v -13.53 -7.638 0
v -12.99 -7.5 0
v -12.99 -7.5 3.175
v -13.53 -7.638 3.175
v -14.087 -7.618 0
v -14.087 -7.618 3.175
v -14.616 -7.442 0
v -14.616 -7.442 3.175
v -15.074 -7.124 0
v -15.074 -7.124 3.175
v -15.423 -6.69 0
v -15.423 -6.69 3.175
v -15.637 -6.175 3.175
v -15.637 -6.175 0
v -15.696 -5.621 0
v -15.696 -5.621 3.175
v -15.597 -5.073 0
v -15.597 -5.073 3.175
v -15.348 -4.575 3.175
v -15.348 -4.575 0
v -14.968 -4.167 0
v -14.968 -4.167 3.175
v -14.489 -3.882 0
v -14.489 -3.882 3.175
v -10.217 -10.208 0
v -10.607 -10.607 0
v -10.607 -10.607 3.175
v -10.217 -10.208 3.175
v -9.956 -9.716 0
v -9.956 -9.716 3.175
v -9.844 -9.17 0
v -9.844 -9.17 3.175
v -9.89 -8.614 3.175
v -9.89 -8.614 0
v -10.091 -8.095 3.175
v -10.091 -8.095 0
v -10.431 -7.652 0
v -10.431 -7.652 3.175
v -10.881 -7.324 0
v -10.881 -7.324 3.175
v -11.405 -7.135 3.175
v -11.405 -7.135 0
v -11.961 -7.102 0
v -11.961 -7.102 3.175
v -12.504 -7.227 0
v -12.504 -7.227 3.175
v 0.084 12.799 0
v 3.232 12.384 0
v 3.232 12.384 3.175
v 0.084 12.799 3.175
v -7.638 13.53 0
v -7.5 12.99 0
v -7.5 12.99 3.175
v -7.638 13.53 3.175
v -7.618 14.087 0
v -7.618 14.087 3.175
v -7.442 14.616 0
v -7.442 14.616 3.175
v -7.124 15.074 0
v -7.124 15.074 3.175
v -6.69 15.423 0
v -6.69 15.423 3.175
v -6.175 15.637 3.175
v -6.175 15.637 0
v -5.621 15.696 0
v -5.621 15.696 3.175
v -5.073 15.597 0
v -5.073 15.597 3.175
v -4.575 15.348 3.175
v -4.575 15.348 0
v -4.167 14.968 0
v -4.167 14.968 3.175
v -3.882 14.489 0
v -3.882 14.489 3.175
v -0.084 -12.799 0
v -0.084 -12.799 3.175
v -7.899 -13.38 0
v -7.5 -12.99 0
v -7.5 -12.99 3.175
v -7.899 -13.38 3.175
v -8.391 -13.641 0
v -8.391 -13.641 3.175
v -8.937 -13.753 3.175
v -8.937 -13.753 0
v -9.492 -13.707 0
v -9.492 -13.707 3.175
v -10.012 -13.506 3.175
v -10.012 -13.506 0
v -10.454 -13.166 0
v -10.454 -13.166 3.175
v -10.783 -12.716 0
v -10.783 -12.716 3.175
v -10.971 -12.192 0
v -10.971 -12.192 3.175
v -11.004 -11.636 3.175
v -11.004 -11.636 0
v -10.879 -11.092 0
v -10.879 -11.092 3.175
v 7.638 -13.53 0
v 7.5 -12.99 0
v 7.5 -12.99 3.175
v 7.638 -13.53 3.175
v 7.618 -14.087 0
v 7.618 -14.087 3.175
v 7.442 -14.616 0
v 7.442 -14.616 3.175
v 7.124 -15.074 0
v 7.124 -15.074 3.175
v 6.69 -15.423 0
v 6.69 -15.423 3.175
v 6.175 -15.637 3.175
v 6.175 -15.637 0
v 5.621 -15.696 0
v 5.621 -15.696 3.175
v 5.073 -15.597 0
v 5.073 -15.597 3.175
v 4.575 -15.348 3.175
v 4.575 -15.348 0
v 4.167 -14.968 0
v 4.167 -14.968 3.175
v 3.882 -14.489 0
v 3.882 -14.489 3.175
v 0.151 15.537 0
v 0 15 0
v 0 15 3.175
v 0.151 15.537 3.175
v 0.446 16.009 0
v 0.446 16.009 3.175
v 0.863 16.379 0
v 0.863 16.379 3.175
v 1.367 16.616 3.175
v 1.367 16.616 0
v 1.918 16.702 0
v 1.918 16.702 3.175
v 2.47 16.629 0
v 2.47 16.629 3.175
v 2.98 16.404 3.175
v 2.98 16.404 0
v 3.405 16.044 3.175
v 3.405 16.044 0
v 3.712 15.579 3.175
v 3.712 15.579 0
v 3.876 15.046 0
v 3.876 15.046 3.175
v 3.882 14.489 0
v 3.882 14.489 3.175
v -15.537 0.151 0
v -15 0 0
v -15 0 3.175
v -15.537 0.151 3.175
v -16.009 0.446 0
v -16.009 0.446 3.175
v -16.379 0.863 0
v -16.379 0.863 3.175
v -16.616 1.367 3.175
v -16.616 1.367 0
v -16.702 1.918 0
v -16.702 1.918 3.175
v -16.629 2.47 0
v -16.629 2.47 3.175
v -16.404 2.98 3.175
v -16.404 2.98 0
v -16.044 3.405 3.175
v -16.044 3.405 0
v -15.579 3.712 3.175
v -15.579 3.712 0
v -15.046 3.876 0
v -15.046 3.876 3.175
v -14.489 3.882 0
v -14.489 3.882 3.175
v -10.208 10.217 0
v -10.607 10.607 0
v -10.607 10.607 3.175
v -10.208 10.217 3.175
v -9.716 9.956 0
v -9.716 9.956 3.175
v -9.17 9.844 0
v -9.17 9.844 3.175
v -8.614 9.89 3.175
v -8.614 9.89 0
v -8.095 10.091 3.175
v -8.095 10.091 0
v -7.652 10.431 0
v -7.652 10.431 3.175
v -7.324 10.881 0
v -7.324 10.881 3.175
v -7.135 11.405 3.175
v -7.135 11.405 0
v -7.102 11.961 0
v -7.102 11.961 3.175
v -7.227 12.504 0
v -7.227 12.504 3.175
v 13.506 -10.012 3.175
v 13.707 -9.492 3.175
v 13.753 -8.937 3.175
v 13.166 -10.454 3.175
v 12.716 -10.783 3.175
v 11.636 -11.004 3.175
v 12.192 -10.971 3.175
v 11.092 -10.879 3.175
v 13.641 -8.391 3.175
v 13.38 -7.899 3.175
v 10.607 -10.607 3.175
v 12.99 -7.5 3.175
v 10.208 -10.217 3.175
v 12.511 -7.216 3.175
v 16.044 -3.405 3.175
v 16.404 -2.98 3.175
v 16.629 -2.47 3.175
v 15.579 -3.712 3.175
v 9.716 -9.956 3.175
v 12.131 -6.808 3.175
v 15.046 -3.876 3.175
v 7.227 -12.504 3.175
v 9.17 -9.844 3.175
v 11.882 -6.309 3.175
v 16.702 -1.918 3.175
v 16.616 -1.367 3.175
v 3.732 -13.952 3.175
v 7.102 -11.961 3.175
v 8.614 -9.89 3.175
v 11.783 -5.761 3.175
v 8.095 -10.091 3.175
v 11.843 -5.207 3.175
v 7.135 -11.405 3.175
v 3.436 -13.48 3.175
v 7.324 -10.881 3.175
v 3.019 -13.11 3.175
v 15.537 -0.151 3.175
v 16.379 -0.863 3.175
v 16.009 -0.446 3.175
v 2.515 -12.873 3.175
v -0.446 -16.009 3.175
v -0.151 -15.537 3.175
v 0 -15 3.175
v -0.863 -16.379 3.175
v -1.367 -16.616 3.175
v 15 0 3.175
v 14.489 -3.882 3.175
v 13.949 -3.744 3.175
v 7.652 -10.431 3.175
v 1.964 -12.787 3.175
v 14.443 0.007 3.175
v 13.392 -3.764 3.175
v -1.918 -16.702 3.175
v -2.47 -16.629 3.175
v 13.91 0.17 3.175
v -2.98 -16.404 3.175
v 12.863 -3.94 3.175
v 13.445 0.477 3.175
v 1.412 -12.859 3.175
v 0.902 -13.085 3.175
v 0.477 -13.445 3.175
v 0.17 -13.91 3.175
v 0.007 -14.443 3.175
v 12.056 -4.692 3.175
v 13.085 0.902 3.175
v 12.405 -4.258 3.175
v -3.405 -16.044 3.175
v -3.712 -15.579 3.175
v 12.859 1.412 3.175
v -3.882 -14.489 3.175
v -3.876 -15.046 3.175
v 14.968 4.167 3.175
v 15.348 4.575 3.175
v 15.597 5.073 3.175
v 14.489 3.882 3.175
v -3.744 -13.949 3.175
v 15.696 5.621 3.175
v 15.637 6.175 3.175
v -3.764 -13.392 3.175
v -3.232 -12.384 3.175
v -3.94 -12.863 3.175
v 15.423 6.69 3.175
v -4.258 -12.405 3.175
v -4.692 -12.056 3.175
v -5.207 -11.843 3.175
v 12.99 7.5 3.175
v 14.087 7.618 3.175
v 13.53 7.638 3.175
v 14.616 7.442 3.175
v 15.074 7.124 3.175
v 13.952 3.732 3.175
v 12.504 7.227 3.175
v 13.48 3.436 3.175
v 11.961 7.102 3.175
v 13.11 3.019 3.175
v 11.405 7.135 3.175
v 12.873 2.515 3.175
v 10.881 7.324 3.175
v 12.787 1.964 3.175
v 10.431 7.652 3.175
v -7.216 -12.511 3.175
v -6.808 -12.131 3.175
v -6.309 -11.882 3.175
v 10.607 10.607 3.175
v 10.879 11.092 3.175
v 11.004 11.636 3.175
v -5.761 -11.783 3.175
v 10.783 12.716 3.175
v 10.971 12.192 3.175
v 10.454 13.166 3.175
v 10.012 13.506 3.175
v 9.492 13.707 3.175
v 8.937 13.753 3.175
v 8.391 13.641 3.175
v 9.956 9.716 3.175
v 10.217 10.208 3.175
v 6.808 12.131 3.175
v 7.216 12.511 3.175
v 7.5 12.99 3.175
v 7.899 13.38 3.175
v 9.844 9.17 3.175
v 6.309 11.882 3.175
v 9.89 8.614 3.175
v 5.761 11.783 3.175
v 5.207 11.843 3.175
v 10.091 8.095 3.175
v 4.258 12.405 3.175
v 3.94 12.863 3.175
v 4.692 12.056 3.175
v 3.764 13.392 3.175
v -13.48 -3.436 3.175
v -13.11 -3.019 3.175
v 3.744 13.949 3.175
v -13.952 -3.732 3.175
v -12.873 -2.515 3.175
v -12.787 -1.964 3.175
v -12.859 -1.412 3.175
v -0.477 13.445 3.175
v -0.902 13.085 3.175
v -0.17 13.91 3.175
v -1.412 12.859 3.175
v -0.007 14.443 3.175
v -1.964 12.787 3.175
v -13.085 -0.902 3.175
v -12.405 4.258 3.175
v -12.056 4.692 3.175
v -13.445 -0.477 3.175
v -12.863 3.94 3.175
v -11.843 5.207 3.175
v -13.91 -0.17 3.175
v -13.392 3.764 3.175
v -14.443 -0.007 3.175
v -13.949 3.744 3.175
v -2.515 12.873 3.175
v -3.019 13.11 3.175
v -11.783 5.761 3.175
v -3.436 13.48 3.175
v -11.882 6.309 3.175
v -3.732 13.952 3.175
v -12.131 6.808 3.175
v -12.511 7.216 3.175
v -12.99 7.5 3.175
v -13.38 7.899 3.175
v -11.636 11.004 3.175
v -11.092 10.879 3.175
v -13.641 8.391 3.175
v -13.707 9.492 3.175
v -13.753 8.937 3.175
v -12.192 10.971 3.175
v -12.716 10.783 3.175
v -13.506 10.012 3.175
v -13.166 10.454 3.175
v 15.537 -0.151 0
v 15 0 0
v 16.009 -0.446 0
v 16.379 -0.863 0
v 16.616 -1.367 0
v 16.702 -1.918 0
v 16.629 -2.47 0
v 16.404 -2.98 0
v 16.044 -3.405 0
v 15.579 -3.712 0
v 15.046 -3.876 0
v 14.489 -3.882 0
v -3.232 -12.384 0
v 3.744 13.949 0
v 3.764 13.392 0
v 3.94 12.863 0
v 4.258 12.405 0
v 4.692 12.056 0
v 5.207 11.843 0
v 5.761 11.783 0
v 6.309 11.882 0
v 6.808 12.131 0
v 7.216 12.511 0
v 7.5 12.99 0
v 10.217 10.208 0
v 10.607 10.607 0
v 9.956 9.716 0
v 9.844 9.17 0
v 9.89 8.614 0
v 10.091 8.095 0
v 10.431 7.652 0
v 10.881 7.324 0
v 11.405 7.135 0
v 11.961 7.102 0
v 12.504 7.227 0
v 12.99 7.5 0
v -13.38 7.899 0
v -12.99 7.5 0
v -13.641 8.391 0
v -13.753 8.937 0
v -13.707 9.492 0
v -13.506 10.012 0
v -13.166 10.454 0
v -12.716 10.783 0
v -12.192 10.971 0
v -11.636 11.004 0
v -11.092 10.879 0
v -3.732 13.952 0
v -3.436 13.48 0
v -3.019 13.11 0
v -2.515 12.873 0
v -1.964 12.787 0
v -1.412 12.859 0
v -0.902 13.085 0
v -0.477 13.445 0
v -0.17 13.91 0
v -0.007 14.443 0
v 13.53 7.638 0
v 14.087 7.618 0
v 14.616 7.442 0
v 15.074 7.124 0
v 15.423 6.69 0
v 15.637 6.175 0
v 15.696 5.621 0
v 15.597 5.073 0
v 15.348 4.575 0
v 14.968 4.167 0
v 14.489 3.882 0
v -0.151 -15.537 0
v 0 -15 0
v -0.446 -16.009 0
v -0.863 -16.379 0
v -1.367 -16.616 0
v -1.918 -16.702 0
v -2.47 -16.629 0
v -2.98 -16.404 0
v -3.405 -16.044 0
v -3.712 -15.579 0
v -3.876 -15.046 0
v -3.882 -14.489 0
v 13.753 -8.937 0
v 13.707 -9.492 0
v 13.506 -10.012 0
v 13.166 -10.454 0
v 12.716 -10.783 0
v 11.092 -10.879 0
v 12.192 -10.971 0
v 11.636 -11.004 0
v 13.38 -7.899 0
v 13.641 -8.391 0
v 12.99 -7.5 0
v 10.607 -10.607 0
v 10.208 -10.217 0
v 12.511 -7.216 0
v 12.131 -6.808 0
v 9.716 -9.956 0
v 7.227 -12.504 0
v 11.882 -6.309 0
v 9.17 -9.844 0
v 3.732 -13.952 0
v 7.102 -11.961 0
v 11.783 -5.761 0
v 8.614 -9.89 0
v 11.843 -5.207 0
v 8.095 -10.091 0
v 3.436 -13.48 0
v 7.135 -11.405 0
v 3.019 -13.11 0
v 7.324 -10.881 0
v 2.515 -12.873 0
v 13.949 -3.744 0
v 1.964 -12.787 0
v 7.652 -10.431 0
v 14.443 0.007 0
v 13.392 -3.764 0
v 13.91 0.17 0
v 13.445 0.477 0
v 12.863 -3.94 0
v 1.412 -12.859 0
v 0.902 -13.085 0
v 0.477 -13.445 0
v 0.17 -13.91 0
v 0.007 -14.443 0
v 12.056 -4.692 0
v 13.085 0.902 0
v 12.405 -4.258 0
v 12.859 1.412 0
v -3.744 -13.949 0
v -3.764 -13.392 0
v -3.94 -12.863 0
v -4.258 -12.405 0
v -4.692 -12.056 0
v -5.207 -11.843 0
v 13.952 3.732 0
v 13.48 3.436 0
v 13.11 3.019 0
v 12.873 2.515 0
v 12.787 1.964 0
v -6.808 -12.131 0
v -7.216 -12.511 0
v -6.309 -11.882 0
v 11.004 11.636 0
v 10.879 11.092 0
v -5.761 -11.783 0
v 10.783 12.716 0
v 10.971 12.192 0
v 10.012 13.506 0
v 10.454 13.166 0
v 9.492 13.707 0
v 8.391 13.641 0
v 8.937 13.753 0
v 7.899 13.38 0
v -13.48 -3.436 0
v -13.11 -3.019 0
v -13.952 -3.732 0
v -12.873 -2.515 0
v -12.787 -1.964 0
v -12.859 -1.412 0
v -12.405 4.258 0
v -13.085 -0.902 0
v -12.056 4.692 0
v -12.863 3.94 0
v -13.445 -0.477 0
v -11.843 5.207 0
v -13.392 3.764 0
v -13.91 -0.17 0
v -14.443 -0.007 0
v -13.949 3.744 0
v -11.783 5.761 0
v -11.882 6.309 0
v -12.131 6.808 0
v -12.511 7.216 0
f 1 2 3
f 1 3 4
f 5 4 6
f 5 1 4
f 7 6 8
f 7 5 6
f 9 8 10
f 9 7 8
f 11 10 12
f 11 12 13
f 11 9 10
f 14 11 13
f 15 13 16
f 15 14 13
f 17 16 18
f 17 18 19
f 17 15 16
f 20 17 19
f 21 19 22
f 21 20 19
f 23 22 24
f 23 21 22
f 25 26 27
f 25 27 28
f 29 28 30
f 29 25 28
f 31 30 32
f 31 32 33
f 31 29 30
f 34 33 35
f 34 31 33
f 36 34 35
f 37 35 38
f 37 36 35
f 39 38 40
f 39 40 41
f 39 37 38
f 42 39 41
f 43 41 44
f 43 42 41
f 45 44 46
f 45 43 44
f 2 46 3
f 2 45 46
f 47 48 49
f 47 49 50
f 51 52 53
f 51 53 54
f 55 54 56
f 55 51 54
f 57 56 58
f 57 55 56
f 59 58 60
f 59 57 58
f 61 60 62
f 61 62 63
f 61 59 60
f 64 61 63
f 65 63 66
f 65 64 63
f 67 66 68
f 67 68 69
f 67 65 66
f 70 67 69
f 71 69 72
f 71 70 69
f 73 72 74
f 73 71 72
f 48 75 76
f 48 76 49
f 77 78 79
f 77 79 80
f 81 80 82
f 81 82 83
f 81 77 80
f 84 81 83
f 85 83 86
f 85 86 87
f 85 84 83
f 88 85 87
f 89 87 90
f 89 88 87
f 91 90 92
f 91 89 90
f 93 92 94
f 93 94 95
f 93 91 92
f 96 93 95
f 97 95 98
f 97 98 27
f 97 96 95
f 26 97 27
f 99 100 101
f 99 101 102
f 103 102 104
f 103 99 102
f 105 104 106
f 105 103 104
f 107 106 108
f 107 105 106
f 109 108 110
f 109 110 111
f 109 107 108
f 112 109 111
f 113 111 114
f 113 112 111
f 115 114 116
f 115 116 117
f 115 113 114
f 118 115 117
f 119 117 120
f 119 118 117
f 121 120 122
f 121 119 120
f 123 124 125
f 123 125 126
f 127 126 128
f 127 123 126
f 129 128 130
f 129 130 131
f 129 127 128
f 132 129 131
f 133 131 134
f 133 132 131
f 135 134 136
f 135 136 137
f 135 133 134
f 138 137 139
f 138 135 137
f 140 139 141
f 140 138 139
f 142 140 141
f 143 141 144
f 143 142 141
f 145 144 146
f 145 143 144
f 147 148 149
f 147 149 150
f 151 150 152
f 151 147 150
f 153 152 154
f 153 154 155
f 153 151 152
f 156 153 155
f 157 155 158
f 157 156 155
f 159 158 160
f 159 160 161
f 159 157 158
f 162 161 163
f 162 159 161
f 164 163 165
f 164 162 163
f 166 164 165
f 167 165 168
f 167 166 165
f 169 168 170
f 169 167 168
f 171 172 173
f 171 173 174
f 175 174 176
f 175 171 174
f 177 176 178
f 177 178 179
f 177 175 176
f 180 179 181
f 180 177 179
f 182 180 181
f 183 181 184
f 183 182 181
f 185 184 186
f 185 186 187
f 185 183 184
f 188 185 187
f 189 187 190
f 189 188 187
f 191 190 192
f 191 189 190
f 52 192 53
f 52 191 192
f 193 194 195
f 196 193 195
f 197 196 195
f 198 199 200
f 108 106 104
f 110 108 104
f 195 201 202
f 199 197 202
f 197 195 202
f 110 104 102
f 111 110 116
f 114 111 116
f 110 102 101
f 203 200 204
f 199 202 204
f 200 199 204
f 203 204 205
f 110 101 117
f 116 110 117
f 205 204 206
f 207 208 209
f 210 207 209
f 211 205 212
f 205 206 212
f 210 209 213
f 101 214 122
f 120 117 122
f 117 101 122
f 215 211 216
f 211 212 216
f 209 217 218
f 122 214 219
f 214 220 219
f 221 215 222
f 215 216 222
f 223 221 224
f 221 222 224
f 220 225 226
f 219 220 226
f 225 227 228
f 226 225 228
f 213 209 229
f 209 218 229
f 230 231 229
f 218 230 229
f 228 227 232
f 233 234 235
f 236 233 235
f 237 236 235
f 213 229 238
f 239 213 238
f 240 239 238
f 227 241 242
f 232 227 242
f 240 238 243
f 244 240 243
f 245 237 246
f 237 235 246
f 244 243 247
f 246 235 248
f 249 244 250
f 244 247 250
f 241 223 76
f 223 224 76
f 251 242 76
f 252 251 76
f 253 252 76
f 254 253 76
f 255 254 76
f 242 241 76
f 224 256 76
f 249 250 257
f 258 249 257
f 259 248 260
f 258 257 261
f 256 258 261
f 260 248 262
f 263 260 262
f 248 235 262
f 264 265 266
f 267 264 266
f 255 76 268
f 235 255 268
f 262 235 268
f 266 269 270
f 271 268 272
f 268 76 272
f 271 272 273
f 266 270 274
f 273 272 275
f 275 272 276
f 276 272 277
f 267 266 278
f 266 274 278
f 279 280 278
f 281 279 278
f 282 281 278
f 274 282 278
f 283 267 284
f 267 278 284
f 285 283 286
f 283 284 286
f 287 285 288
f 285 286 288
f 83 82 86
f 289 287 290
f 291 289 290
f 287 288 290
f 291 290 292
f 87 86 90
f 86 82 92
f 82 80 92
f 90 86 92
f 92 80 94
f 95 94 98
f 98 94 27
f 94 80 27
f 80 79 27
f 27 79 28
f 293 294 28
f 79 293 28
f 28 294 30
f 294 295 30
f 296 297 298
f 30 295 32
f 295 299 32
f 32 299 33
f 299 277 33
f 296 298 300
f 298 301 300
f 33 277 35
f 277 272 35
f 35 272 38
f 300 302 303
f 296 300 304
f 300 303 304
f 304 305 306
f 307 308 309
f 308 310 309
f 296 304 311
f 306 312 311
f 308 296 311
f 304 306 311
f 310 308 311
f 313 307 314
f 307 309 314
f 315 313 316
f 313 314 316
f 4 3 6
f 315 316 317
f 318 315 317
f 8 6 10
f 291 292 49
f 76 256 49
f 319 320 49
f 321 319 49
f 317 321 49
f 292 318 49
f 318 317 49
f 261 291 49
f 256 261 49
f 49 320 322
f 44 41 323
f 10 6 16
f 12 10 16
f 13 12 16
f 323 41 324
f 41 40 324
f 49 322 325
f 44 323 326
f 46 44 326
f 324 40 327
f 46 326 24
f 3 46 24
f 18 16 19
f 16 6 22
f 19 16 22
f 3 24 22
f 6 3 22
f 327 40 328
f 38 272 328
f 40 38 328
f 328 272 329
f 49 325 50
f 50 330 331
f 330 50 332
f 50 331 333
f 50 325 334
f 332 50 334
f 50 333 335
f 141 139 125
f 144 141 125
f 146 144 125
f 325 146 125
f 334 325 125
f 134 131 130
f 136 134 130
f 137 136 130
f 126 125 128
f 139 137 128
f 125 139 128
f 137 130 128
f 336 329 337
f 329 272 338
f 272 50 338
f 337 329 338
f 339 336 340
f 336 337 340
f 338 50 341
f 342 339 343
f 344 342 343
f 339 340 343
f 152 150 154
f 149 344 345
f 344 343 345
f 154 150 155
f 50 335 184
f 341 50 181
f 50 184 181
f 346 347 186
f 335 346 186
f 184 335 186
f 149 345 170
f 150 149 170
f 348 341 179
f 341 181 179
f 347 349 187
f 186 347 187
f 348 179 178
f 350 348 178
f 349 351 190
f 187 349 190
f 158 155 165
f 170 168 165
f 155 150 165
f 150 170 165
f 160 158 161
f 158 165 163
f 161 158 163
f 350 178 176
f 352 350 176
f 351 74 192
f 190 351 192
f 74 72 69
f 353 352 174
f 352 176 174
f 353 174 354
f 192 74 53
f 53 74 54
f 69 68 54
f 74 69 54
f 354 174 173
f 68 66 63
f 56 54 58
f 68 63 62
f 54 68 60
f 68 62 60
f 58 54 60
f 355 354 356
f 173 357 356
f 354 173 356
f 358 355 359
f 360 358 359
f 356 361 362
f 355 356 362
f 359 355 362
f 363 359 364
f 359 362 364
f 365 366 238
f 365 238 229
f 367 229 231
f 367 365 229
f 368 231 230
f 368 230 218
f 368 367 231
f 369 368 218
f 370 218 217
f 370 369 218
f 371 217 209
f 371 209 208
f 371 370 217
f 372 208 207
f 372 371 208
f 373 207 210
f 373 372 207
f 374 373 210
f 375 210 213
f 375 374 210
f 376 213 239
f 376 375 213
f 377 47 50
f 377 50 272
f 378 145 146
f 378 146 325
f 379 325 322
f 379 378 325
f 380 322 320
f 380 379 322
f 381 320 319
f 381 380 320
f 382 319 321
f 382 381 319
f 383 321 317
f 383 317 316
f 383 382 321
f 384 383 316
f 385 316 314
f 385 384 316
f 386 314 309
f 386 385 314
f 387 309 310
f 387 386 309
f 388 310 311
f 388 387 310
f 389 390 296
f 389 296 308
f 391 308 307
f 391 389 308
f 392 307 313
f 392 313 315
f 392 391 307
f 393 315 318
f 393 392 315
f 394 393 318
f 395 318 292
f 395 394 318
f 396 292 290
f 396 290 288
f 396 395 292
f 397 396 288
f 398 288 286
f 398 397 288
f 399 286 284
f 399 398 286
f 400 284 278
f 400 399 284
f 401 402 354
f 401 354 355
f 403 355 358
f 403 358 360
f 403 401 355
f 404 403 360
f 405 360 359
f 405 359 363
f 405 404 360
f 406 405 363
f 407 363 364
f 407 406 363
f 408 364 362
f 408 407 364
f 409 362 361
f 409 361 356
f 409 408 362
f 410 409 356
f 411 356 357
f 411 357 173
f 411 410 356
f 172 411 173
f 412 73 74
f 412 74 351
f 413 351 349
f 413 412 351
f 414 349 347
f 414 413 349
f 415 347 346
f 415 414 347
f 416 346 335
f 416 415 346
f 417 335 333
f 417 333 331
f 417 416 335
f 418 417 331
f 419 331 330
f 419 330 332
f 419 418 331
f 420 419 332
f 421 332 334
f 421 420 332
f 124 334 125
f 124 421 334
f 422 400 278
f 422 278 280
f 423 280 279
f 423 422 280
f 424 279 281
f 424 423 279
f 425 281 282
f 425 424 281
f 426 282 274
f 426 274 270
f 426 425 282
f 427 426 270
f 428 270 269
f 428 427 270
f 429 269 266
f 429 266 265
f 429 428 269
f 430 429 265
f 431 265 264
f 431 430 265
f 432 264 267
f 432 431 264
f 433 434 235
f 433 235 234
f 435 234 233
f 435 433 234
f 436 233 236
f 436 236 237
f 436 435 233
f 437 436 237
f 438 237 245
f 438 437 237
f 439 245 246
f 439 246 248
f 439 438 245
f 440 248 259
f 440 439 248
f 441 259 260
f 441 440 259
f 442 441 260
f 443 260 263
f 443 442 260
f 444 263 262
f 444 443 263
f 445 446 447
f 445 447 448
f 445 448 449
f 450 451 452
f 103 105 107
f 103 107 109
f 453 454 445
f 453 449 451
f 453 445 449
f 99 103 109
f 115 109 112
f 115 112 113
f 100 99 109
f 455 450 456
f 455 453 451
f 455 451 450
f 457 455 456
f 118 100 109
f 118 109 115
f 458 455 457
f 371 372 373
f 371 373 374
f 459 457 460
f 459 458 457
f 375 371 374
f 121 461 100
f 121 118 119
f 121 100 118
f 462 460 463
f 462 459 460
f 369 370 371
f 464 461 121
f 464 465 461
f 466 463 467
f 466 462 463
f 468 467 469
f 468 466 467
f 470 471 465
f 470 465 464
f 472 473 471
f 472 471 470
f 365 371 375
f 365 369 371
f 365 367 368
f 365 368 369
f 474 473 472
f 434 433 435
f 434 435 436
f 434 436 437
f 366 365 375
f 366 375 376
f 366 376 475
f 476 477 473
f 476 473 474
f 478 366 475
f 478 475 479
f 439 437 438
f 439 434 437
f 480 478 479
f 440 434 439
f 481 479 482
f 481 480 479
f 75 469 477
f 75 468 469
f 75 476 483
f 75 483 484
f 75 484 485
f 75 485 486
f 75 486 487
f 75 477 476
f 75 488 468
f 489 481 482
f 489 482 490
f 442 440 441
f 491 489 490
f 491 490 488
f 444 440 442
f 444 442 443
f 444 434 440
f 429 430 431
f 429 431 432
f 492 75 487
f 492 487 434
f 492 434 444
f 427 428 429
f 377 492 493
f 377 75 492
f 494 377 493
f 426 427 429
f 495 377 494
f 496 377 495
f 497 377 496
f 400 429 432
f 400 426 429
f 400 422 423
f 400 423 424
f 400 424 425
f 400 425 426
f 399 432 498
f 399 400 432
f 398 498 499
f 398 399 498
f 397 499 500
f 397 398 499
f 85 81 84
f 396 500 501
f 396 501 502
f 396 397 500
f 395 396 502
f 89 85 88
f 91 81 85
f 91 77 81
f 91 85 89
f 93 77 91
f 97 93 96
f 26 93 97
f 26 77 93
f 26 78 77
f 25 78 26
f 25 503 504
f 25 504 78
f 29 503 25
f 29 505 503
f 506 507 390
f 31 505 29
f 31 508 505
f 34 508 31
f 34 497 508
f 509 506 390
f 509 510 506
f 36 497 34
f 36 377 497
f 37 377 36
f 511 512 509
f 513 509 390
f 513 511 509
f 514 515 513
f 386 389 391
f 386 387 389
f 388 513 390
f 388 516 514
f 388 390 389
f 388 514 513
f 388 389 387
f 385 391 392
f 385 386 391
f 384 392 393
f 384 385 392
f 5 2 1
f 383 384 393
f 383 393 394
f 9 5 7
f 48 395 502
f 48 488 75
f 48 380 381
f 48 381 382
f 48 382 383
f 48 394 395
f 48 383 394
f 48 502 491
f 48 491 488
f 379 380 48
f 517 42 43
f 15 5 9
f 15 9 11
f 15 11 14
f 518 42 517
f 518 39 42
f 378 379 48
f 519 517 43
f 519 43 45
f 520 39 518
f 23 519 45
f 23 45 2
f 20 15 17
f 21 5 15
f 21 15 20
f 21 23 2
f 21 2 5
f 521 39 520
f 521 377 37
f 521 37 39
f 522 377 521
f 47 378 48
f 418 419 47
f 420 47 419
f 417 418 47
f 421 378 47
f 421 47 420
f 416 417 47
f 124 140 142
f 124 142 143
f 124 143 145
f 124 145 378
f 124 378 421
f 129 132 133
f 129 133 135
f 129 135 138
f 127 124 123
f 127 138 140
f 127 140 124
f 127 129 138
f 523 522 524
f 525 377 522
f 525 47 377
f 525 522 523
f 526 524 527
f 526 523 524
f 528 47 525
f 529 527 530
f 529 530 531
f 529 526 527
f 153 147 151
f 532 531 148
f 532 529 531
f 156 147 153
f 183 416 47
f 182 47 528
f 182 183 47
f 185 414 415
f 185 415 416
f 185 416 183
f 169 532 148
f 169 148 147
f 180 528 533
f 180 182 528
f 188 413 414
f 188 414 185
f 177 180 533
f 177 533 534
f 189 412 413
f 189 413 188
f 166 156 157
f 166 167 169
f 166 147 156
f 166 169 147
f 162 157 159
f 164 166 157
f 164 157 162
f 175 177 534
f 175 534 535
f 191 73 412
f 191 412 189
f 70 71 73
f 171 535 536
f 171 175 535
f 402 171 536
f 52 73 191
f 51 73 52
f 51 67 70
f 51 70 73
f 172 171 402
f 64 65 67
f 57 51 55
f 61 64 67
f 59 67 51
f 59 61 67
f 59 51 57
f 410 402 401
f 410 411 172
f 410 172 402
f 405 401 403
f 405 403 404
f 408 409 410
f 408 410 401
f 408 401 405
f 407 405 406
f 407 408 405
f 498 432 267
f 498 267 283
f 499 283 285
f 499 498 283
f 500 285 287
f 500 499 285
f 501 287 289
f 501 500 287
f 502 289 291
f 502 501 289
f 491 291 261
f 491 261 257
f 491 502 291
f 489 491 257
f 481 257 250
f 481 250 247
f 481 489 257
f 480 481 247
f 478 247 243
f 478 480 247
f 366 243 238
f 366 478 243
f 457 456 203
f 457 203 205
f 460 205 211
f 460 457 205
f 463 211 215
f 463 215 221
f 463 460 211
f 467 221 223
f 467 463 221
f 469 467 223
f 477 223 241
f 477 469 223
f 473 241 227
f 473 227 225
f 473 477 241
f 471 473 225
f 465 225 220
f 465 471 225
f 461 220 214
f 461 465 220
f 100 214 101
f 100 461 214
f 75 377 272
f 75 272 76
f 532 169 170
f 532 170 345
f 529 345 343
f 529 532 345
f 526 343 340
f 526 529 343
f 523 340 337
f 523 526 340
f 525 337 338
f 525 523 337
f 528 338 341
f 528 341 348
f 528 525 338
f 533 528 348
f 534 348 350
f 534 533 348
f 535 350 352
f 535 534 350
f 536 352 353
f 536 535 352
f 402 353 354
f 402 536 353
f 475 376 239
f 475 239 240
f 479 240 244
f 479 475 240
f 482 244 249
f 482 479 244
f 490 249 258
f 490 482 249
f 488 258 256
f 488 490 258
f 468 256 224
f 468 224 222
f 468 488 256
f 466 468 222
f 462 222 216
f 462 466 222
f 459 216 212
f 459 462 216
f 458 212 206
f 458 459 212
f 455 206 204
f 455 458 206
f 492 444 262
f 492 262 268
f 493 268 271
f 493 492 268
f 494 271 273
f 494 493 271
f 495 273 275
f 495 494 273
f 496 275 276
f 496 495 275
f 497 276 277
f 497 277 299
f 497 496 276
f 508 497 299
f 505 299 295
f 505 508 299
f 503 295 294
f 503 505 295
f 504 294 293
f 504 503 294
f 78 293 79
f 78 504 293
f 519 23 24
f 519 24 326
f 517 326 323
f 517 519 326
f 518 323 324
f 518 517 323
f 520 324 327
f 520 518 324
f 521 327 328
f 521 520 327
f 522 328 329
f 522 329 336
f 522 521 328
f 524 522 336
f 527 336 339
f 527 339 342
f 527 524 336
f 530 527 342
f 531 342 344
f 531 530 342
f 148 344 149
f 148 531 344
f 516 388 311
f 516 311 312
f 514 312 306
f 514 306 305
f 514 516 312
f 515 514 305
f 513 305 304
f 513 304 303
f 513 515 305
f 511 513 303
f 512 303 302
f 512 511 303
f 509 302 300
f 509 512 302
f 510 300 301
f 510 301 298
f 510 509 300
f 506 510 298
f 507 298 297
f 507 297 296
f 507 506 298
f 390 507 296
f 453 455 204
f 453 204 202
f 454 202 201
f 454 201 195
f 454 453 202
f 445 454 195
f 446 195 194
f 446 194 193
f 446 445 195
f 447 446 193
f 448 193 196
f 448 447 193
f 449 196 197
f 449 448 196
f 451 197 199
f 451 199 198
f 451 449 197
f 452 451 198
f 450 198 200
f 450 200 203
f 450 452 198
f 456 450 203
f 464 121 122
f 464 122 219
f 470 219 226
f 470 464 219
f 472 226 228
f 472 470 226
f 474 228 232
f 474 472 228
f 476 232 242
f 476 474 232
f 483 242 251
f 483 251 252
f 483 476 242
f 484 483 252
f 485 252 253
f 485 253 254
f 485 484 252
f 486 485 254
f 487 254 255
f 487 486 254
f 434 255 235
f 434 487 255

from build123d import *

# Parameters (mm, degrees)
BOSS_EXTRUDE1_DEPTH = 3.175
CUT_EXTRUDE1_DEPTH  = 3.175


with BuildPart() as part:
    # Sketch1 → Boss-Extrude1 (new body)
    with BuildSketch(Plane.XY):
        with BuildLine():
            ThreePointArc((-3.882285677, 14.488887394), (-1.685586535, 12.803300859), (0, 15))
            ThreePointArc((0, 15), (2.196699141, 16.685586535), (3.882285677, 14.488887394))
            ThreePointArc((3.882285677, 14.488887394), (4.941889669, 11.930777064), (7.5, 12.990381057))
            ThreePointArc((7.5, 12.990381057), (10.245190528, 13.351792246), (10.606601718, 10.606601718))
            ThreePointArc((10.606601718, 10.606601718), (10.245190528, 7.861411189), (12.990381057, 7.5))
            ThreePointArc((12.990381057, 7.5), (15.548491387, 6.440396007), (14.488887394, 3.882285677))
            ThreePointArc((14.488887394, 3.882285677), (12.803300859, 1.685586535), (15, 0))
            ThreePointArc((15, 0), (16.685586535, -2.196699141), (14.488887394, -3.882285677))
            ThreePointArc((14.488887394, -3.882285677), (11.930777064, -4.941889669), (12.990381057, -7.5))
            ThreePointArc((12.990381057, -7.5), (13.351792246, -10.245190528), (10.606601718, -10.606601718))
            ThreePointArc((10.606601718, -10.606601718), (7.861411189, -10.245190528), (7.5, -12.990381057))
            ThreePointArc((7.5, -12.990381057), (6.440396007, -15.548491387), (3.882285677, -14.488887394))
            ThreePointArc((3.882285677, -14.488887394), (1.685586535, -12.803300859), (0, -15))
            ThreePointArc((0, -15), (-2.196699141, -16.685586535), (-3.882285677, -14.488887394))
            ThreePointArc((-3.882285677, -14.488887394), (-4.941889669, -11.930777064), (-7.5, -12.990381057))
            ThreePointArc((-7.5, -12.990381057), (-10.245190528, -13.351792246), (-10.606601718, -10.606601718))
            ThreePointArc((-10.606601718, -10.606601718), (-10.245190528, -7.861411189), (-12.990381057, -7.5))
            ThreePointArc((-12.990381057, -7.5), (-15.548491387, -6.440396007), (-14.488887394, -3.882285677))
            ThreePointArc((-14.488887394, -3.882285677), (-12.803300859, -1.685586535), (-15, 0))
            ThreePointArc((-15, 0), (-16.685586535, 2.196699141), (-14.488887394, 3.882285677))
            ThreePointArc((-14.488887394, 3.882285677), (-11.930777064, 4.941889669), (-12.990381057, 7.5))
            ThreePointArc((-12.990381057, 7.5), (-13.351792246, 10.245190528), (-10.606601718, 10.606601718))
            ThreePointArc((-10.606601718, 10.606601718), (-7.861411189, 10.245190528), (-7.5, 12.990381057))
            ThreePointArc((-7.5, 12.990381057), (-6.440396007, 15.548491387), (-3.882285677, 14.488887394))
        make_face()
    extrude(amount=BOSS_EXTRUDE1_DEPTH)

    # Sketch3 → Cut-Extrude1 (cut)
    with BuildSketch(Plane.XY):
        Polygon((3.231601359, 12.384139409), (0.083763924, 12.79856007), (-3.231601359, -12.384139409), (-0.083763924, -12.79856007), align=None)
    extrude(amount=CUT_EXTRUDE1_DEPTH, mode=Mode.SUBTRACT)


solid = part.part
